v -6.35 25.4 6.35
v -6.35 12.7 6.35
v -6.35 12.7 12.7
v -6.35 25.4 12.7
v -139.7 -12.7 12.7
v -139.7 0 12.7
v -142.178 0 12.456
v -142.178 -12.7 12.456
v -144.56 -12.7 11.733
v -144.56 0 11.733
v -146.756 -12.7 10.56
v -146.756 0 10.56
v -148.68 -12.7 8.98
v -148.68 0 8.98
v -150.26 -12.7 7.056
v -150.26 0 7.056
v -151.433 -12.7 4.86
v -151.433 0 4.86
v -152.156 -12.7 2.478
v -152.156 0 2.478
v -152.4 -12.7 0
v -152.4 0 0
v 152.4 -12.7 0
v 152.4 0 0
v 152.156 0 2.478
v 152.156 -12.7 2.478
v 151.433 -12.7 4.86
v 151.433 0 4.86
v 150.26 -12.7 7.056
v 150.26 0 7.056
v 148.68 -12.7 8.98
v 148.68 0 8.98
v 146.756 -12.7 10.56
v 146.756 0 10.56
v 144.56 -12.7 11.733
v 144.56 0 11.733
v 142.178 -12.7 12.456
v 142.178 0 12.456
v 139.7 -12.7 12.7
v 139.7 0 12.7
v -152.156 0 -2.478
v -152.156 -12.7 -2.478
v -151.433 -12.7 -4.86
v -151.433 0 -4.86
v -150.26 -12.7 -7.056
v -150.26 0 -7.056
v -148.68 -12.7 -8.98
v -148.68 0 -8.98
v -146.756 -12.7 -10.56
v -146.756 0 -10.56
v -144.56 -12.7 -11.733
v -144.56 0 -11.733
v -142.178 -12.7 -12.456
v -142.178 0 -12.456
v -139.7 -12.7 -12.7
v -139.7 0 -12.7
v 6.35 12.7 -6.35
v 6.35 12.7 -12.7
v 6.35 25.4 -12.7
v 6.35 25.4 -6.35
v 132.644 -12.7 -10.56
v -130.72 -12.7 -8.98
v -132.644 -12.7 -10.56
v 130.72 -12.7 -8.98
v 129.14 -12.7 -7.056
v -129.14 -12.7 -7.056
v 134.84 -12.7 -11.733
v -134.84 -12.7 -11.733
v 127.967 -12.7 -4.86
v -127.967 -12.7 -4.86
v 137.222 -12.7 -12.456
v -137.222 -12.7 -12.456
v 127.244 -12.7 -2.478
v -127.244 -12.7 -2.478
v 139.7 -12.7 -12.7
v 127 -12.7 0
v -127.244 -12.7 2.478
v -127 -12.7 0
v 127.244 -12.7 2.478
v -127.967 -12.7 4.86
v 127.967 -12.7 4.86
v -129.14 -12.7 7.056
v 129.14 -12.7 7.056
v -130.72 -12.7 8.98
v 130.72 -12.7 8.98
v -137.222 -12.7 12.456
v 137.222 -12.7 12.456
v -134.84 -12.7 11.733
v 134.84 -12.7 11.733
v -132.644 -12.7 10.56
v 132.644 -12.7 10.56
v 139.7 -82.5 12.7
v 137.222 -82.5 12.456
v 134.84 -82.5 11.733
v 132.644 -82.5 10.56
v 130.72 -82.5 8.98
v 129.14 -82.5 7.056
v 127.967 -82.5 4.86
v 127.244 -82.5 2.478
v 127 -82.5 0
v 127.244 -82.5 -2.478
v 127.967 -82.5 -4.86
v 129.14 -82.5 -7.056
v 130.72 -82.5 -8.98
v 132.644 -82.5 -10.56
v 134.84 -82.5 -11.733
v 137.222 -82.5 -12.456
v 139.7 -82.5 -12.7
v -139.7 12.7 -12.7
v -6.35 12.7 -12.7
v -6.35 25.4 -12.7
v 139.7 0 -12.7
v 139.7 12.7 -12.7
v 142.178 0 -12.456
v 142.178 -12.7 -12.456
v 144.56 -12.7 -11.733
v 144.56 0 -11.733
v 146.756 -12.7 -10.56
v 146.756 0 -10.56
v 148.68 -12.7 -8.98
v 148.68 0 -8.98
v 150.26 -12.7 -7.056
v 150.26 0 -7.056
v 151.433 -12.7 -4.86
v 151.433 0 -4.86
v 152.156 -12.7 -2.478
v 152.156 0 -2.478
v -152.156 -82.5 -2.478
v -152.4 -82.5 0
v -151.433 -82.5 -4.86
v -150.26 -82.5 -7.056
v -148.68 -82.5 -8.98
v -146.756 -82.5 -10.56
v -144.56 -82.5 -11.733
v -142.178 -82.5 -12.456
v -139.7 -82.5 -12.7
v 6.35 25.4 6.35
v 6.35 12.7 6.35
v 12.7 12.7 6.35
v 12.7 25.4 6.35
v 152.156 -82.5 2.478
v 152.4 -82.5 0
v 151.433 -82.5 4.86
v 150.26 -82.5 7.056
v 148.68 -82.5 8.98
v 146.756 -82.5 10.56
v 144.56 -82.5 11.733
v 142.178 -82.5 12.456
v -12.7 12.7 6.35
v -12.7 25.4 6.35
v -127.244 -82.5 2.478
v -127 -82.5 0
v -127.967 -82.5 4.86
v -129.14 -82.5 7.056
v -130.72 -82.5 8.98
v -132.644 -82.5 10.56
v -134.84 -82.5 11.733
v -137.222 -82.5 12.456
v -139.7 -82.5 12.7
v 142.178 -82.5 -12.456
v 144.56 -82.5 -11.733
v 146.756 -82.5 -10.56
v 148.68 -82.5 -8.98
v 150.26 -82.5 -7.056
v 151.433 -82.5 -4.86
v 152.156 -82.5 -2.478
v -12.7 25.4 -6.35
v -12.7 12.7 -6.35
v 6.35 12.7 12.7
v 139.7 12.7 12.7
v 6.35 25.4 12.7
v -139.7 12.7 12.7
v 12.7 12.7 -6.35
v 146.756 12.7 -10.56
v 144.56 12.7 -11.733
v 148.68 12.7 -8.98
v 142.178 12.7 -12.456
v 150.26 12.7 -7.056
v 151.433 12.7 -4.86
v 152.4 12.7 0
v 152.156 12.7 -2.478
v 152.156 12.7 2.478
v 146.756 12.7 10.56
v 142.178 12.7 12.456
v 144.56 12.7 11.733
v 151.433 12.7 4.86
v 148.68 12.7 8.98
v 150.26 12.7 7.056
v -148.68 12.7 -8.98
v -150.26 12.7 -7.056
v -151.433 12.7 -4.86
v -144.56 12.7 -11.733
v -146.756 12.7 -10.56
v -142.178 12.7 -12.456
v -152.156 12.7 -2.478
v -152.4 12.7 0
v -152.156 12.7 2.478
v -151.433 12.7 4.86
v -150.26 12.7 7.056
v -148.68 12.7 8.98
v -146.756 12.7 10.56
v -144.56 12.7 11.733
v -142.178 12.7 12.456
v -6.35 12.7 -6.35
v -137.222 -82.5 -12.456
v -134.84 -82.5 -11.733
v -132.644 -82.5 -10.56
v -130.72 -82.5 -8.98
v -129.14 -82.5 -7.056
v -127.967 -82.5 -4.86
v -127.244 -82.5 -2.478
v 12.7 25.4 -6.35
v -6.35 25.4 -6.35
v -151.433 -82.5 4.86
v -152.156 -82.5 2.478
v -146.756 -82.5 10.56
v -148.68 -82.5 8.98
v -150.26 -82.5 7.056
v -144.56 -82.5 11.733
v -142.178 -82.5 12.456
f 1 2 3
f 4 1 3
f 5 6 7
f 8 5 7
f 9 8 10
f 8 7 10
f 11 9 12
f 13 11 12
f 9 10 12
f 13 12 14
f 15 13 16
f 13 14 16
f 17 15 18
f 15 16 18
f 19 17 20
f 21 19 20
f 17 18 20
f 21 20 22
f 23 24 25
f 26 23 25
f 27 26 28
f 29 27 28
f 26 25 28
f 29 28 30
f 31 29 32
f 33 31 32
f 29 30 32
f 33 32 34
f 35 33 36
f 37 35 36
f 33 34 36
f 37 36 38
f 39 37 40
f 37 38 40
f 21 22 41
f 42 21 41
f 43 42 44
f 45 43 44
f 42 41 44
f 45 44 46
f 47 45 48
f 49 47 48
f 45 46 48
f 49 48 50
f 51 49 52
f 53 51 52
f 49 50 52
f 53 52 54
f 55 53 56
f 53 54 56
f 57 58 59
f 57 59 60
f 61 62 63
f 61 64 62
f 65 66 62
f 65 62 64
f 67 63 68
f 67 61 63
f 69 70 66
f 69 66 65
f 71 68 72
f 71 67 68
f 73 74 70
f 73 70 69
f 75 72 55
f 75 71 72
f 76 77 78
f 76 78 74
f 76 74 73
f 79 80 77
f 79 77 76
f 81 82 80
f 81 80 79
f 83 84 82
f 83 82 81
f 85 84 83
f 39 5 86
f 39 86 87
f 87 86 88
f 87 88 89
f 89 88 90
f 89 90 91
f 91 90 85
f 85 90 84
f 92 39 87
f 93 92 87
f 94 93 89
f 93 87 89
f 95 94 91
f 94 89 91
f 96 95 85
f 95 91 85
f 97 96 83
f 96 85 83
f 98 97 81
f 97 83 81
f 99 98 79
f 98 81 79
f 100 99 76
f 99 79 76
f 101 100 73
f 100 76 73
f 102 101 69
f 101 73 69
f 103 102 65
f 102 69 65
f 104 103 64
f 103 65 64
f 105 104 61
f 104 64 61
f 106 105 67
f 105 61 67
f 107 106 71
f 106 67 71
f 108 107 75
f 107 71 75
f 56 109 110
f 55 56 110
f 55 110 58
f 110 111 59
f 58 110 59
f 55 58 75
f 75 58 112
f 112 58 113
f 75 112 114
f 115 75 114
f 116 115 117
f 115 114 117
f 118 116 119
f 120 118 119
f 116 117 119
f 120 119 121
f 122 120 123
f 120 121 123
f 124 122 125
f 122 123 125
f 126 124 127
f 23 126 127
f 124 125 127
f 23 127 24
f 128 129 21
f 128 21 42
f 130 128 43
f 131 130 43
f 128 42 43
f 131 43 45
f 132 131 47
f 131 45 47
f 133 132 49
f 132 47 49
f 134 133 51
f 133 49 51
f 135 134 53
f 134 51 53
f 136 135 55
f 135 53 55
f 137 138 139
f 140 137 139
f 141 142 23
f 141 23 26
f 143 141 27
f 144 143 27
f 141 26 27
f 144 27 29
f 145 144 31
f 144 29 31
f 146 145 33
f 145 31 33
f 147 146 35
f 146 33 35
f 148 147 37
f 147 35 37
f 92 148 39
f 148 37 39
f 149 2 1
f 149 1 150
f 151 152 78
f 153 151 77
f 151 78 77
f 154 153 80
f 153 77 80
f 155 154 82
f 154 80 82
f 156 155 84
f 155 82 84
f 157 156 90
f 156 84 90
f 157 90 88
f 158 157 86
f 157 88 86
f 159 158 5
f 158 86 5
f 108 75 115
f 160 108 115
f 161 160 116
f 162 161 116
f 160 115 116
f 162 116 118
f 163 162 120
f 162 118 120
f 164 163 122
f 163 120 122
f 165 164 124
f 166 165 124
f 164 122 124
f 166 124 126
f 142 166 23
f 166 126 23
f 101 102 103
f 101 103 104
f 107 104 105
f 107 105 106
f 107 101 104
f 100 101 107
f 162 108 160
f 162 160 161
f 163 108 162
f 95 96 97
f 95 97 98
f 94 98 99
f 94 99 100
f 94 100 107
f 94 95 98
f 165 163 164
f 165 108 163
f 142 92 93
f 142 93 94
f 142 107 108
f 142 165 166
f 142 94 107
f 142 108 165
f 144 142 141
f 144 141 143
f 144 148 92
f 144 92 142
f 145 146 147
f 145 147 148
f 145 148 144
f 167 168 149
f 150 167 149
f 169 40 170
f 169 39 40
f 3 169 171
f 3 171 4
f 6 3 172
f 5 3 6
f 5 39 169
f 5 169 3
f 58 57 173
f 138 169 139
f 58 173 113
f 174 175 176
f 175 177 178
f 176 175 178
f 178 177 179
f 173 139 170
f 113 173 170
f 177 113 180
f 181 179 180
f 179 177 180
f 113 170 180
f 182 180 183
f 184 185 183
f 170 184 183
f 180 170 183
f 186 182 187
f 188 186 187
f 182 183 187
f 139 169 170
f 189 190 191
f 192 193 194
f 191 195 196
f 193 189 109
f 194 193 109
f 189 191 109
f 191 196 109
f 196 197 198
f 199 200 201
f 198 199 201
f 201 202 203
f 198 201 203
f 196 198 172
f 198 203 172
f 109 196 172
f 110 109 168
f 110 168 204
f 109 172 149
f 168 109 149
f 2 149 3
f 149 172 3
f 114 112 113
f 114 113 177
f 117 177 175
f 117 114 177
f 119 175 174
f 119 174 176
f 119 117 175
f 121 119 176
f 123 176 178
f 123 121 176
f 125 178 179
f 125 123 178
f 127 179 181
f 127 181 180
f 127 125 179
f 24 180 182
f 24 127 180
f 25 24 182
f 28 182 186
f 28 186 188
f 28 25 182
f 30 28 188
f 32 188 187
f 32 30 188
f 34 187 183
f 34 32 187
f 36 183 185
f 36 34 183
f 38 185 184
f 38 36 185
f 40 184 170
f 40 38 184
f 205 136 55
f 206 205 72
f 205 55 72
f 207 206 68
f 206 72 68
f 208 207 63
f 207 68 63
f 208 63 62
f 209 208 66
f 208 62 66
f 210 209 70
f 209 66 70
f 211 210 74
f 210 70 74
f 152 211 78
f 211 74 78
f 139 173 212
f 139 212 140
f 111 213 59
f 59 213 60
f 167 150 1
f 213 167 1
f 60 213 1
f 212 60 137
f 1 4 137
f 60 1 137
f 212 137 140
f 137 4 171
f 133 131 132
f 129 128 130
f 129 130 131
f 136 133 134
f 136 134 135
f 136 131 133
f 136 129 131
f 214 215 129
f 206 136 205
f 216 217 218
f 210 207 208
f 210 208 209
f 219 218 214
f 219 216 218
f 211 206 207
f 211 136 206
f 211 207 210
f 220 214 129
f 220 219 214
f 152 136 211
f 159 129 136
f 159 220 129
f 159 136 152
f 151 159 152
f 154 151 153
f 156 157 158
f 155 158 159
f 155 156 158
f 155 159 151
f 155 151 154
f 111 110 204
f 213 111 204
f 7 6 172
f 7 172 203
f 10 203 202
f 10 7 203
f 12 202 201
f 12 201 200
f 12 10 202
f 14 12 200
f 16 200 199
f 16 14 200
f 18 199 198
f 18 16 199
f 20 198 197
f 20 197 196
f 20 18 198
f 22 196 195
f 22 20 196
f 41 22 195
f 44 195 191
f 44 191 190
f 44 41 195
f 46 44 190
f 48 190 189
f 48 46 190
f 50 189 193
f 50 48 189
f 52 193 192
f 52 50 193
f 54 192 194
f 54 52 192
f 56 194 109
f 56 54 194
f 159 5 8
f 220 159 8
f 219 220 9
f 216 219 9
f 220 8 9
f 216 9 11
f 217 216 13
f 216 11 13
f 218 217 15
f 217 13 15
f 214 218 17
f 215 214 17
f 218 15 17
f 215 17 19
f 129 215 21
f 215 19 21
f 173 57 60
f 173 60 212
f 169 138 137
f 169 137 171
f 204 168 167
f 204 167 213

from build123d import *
from build123d import SkipClean  # not in build123d's __all__

# Parameters (mm, degrees)
F1_DEPTH = 82.5
F0_W     = 12.7
F0_H     = 6.35
F2_DEPTH = 12.7
F0_W_2   = 6.35
F0_H_2   = 12.7
F4_DEPTH = 25.4
F5_DEPTH = 12.7


# Not quite as in the source:
# - after a boolean that leaves OpenCascade's solid faulty, fix() repairs it
# - a feature of the source that left no trace in its solid (it failed there, or was rolled back) is left out
# - a feature names something its author has since deleted; it is built from what else it names


with BuildPart() as f1:
    # F0 (on Front) → F1 (new body)
    with BuildSketch(Plane.XZ):
        with BuildLine():
            Line((-139.7, 0), (-139.7, 12.7))
            ThreePointArc((-139.7, 12.7), (-148.6802561211, 8.9802561211), (-152.4, 0))
            Line((-152.4, 0), (-139.7, 0))
        make_face()
        with BuildLine():
            ThreePointArc((-127, 0), (-130.7197438789, 8.9802561211), (-139.7, 12.7))
            Line((-139.7, 12.7), (-139.7, 0))
            Line((-139.7, 0), (-139.7, -12.7))
            ThreePointArc((-139.7, -12.7), (-130.7197438789, -8.9802561211), (-127, 0))
        make_face()
        with BuildLine():
            Line((-139.7, -12.7), (-139.7, 0))
            Line((-139.7, 0), (-152.4, 0))
            ThreePointArc((-152.4, 0), (-148.6802561211, -8.9802561211), (-139.7, -12.7))
        make_face()
        with BuildLine():
            ThreePointArc((-127, 0), (-130.7197438789, 8.9802561211), (-139.7, 12.7))
            Line((-139.7, 12.7), (-139.7, 0))
            Line((-139.7, 0), (-139.7, -12.7))
            ThreePointArc((-139.7, -12.7), (-130.7197438789, -8.9802561211), (-127, 0))
        make_face()
    extrude(amount=F1_DEPTH)



with BuildPart() as f1b:
    # F0 (on Front) → F1, piece 2 (new body)
    with BuildSketch(Plane.XZ):
        with BuildLine():
            Line((139.7, -12.7), (139.7, 12.7))
            ThreePointArc((139.7, 12.7), (127, 0), (139.7, -12.7))
        make_face()
        with BuildLine():
            ThreePointArc((152.4, 0), (148.6802561211, 8.9802561211), (139.7, 12.7))
            Line((139.7, 12.7), (139.7, -12.7))
            ThreePointArc((139.7, -12.7), (148.6802561211, -8.9802561211), (152.4, 0))
        make_face()
        with BuildLine():
            ThreePointArc((152.4, 0), (148.6802561211, 8.9802561211), (139.7, 12.7))
            Line((139.7, 12.7), (139.7, -12.7))
            ThreePointArc((139.7, -12.7), (148.6802561211, -8.9802561211), (152.4, 0))
        make_face()
    extrude(amount=F1_DEPTH)


with BuildPart() as f1_1:
    add(f1.part, clean=False)

    with SkipClean():  # cleaning this boolean's faces spoils the solid; the shape is the same uncleaned
        add(f1b.part)  # F2 merges F1b
    # F0 (on Front) → F2 (join, symmetric)
    with BuildSketch(Plane.XZ):
        with BuildLine():
            Line((139.7, 12.7), (6.35, 12.7))
            Line((6.35, 12.7), (6.35, 6.35))
            Line((6.35, 6.35), (12.7, 6.35))
            Line((12.7, 6.35), (12.7, -6.35))
            Line((12.7, -6.35), (6.35, -6.35))
            Line((6.35, -6.35), (6.35, -12.7))
            Line((6.35, -12.7), (139.7, -12.7))
            ThreePointArc((139.7, -12.7), (127, 0), (139.7, 12.7))
        make_face()
        with BuildLine():
            Line((139.7, -12.7), (139.7, 12.7))
            ThreePointArc((139.7, 12.7), (127, 0), (139.7, -12.7))
        make_face()
        with BuildLine():
            Line((139.7, -12.7), (139.7, 12.7))
            ThreePointArc((139.7, 12.7), (127, 0), (139.7, -12.7))
        make_face()
        with BuildLine():
            ThreePointArc((152.4, 0), (148.6802561211, 8.9802561211), (139.7, 12.7))
            Line((139.7, 12.7), (139.7, -12.7))
            ThreePointArc((139.7, -12.7), (148.6802561211, -8.9802561211), (152.4, 0))
        make_face()
        with BuildLine():
            Line((-139.7, 0), (-139.7, 12.7))
            ThreePointArc((-139.7, 12.7), (-148.6802561211, 8.9802561211), (-152.4, 0))
            Line((-152.4, 0), (-139.7, 0))
        make_face()
        with BuildLine():
            Line((-139.7, -12.7), (-139.7, 0))
            Line((-139.7, 0), (-152.4, 0))
            ThreePointArc((-152.4, 0), (-148.6802561211, -8.9802561211), (-139.7, -12.7))
        make_face()
        with BuildLine():
            ThreePointArc((-127, 0), (-130.7197438789, 8.9802561211), (-139.7, 12.7))
            Line((-139.7, 12.7), (-139.7, 0))
            Line((-139.7, 0), (-139.7, -12.7))
            ThreePointArc((-139.7, -12.7), (-130.7197438789, -8.9802561211), (-127, 0))
        make_face()
        with BuildLine():
            Line((-6.35, 12.7), (-139.7, 12.7))
            ThreePointArc((-139.7, 12.7), (-130.7197438789, 8.9802561211), (-127, 0))
            ThreePointArc((-127, 0), (-130.7197438789, -8.9802561211), (-139.7, -12.7))
            Line((-139.7, -12.7), (-6.35, -12.7))
            Line((-6.35, -12.7), (-6.35, -6.35))
            Line((-6.35, -6.35), (-12.7, -6.35))
            Line((-12.7, -6.35), (-12.7, 6.35))
            Line((-12.7, 6.35), (-6.35, 6.35))
            Line((-6.35, 6.35), (-6.35, 12.7))
        make_face()
        with Locations((0, 9.525)):
            Rectangle(F0_W, F0_H)
    with SkipClean():  # cleaning this boolean's faces spoils the solid; the shape is the same uncleaned
        extrude(amount=F2_DEPTH, both=True)

    # F0 (on Front) → F4 (join)
    with BuildSketch(Plane.XZ):
        with Locations((-9.525, 0)):
            Rectangle(F0_W_2, F0_H_2)
        Rectangle(F0_W, F0_H_2)
        with Locations((0, 9.525)):
            Rectangle(F0_W, F0_H)
        with Locations((9.525, 0)):
            Rectangle(F0_W_2, F0_H_2)
        with Locations((0, -9.525)):
            Rectangle(F0_W, F0_H)
    extrude(amount=-F4_DEPTH)

    add(f1_1.part.fix(), mode=Mode.REPLACE)

    # F0 (on Front) → F5 (join)
    with BuildSketch(Plane.XZ):
        with Locations((9.525, 0)):
            Rectangle(F0_W_2, F0_H_2)
        with Locations((0, -9.525)):
            Rectangle(F0_W, F0_H)
        with Locations((0, 9.525)):
            Rectangle(F0_W, F0_H)
        with Locations((-9.525, 0)):
            Rectangle(F0_W_2, F0_H_2)
        Rectangle(F0_W, F0_H_2)
    extrude(amount=F5_DEPTH)


solid = f1_1.part
